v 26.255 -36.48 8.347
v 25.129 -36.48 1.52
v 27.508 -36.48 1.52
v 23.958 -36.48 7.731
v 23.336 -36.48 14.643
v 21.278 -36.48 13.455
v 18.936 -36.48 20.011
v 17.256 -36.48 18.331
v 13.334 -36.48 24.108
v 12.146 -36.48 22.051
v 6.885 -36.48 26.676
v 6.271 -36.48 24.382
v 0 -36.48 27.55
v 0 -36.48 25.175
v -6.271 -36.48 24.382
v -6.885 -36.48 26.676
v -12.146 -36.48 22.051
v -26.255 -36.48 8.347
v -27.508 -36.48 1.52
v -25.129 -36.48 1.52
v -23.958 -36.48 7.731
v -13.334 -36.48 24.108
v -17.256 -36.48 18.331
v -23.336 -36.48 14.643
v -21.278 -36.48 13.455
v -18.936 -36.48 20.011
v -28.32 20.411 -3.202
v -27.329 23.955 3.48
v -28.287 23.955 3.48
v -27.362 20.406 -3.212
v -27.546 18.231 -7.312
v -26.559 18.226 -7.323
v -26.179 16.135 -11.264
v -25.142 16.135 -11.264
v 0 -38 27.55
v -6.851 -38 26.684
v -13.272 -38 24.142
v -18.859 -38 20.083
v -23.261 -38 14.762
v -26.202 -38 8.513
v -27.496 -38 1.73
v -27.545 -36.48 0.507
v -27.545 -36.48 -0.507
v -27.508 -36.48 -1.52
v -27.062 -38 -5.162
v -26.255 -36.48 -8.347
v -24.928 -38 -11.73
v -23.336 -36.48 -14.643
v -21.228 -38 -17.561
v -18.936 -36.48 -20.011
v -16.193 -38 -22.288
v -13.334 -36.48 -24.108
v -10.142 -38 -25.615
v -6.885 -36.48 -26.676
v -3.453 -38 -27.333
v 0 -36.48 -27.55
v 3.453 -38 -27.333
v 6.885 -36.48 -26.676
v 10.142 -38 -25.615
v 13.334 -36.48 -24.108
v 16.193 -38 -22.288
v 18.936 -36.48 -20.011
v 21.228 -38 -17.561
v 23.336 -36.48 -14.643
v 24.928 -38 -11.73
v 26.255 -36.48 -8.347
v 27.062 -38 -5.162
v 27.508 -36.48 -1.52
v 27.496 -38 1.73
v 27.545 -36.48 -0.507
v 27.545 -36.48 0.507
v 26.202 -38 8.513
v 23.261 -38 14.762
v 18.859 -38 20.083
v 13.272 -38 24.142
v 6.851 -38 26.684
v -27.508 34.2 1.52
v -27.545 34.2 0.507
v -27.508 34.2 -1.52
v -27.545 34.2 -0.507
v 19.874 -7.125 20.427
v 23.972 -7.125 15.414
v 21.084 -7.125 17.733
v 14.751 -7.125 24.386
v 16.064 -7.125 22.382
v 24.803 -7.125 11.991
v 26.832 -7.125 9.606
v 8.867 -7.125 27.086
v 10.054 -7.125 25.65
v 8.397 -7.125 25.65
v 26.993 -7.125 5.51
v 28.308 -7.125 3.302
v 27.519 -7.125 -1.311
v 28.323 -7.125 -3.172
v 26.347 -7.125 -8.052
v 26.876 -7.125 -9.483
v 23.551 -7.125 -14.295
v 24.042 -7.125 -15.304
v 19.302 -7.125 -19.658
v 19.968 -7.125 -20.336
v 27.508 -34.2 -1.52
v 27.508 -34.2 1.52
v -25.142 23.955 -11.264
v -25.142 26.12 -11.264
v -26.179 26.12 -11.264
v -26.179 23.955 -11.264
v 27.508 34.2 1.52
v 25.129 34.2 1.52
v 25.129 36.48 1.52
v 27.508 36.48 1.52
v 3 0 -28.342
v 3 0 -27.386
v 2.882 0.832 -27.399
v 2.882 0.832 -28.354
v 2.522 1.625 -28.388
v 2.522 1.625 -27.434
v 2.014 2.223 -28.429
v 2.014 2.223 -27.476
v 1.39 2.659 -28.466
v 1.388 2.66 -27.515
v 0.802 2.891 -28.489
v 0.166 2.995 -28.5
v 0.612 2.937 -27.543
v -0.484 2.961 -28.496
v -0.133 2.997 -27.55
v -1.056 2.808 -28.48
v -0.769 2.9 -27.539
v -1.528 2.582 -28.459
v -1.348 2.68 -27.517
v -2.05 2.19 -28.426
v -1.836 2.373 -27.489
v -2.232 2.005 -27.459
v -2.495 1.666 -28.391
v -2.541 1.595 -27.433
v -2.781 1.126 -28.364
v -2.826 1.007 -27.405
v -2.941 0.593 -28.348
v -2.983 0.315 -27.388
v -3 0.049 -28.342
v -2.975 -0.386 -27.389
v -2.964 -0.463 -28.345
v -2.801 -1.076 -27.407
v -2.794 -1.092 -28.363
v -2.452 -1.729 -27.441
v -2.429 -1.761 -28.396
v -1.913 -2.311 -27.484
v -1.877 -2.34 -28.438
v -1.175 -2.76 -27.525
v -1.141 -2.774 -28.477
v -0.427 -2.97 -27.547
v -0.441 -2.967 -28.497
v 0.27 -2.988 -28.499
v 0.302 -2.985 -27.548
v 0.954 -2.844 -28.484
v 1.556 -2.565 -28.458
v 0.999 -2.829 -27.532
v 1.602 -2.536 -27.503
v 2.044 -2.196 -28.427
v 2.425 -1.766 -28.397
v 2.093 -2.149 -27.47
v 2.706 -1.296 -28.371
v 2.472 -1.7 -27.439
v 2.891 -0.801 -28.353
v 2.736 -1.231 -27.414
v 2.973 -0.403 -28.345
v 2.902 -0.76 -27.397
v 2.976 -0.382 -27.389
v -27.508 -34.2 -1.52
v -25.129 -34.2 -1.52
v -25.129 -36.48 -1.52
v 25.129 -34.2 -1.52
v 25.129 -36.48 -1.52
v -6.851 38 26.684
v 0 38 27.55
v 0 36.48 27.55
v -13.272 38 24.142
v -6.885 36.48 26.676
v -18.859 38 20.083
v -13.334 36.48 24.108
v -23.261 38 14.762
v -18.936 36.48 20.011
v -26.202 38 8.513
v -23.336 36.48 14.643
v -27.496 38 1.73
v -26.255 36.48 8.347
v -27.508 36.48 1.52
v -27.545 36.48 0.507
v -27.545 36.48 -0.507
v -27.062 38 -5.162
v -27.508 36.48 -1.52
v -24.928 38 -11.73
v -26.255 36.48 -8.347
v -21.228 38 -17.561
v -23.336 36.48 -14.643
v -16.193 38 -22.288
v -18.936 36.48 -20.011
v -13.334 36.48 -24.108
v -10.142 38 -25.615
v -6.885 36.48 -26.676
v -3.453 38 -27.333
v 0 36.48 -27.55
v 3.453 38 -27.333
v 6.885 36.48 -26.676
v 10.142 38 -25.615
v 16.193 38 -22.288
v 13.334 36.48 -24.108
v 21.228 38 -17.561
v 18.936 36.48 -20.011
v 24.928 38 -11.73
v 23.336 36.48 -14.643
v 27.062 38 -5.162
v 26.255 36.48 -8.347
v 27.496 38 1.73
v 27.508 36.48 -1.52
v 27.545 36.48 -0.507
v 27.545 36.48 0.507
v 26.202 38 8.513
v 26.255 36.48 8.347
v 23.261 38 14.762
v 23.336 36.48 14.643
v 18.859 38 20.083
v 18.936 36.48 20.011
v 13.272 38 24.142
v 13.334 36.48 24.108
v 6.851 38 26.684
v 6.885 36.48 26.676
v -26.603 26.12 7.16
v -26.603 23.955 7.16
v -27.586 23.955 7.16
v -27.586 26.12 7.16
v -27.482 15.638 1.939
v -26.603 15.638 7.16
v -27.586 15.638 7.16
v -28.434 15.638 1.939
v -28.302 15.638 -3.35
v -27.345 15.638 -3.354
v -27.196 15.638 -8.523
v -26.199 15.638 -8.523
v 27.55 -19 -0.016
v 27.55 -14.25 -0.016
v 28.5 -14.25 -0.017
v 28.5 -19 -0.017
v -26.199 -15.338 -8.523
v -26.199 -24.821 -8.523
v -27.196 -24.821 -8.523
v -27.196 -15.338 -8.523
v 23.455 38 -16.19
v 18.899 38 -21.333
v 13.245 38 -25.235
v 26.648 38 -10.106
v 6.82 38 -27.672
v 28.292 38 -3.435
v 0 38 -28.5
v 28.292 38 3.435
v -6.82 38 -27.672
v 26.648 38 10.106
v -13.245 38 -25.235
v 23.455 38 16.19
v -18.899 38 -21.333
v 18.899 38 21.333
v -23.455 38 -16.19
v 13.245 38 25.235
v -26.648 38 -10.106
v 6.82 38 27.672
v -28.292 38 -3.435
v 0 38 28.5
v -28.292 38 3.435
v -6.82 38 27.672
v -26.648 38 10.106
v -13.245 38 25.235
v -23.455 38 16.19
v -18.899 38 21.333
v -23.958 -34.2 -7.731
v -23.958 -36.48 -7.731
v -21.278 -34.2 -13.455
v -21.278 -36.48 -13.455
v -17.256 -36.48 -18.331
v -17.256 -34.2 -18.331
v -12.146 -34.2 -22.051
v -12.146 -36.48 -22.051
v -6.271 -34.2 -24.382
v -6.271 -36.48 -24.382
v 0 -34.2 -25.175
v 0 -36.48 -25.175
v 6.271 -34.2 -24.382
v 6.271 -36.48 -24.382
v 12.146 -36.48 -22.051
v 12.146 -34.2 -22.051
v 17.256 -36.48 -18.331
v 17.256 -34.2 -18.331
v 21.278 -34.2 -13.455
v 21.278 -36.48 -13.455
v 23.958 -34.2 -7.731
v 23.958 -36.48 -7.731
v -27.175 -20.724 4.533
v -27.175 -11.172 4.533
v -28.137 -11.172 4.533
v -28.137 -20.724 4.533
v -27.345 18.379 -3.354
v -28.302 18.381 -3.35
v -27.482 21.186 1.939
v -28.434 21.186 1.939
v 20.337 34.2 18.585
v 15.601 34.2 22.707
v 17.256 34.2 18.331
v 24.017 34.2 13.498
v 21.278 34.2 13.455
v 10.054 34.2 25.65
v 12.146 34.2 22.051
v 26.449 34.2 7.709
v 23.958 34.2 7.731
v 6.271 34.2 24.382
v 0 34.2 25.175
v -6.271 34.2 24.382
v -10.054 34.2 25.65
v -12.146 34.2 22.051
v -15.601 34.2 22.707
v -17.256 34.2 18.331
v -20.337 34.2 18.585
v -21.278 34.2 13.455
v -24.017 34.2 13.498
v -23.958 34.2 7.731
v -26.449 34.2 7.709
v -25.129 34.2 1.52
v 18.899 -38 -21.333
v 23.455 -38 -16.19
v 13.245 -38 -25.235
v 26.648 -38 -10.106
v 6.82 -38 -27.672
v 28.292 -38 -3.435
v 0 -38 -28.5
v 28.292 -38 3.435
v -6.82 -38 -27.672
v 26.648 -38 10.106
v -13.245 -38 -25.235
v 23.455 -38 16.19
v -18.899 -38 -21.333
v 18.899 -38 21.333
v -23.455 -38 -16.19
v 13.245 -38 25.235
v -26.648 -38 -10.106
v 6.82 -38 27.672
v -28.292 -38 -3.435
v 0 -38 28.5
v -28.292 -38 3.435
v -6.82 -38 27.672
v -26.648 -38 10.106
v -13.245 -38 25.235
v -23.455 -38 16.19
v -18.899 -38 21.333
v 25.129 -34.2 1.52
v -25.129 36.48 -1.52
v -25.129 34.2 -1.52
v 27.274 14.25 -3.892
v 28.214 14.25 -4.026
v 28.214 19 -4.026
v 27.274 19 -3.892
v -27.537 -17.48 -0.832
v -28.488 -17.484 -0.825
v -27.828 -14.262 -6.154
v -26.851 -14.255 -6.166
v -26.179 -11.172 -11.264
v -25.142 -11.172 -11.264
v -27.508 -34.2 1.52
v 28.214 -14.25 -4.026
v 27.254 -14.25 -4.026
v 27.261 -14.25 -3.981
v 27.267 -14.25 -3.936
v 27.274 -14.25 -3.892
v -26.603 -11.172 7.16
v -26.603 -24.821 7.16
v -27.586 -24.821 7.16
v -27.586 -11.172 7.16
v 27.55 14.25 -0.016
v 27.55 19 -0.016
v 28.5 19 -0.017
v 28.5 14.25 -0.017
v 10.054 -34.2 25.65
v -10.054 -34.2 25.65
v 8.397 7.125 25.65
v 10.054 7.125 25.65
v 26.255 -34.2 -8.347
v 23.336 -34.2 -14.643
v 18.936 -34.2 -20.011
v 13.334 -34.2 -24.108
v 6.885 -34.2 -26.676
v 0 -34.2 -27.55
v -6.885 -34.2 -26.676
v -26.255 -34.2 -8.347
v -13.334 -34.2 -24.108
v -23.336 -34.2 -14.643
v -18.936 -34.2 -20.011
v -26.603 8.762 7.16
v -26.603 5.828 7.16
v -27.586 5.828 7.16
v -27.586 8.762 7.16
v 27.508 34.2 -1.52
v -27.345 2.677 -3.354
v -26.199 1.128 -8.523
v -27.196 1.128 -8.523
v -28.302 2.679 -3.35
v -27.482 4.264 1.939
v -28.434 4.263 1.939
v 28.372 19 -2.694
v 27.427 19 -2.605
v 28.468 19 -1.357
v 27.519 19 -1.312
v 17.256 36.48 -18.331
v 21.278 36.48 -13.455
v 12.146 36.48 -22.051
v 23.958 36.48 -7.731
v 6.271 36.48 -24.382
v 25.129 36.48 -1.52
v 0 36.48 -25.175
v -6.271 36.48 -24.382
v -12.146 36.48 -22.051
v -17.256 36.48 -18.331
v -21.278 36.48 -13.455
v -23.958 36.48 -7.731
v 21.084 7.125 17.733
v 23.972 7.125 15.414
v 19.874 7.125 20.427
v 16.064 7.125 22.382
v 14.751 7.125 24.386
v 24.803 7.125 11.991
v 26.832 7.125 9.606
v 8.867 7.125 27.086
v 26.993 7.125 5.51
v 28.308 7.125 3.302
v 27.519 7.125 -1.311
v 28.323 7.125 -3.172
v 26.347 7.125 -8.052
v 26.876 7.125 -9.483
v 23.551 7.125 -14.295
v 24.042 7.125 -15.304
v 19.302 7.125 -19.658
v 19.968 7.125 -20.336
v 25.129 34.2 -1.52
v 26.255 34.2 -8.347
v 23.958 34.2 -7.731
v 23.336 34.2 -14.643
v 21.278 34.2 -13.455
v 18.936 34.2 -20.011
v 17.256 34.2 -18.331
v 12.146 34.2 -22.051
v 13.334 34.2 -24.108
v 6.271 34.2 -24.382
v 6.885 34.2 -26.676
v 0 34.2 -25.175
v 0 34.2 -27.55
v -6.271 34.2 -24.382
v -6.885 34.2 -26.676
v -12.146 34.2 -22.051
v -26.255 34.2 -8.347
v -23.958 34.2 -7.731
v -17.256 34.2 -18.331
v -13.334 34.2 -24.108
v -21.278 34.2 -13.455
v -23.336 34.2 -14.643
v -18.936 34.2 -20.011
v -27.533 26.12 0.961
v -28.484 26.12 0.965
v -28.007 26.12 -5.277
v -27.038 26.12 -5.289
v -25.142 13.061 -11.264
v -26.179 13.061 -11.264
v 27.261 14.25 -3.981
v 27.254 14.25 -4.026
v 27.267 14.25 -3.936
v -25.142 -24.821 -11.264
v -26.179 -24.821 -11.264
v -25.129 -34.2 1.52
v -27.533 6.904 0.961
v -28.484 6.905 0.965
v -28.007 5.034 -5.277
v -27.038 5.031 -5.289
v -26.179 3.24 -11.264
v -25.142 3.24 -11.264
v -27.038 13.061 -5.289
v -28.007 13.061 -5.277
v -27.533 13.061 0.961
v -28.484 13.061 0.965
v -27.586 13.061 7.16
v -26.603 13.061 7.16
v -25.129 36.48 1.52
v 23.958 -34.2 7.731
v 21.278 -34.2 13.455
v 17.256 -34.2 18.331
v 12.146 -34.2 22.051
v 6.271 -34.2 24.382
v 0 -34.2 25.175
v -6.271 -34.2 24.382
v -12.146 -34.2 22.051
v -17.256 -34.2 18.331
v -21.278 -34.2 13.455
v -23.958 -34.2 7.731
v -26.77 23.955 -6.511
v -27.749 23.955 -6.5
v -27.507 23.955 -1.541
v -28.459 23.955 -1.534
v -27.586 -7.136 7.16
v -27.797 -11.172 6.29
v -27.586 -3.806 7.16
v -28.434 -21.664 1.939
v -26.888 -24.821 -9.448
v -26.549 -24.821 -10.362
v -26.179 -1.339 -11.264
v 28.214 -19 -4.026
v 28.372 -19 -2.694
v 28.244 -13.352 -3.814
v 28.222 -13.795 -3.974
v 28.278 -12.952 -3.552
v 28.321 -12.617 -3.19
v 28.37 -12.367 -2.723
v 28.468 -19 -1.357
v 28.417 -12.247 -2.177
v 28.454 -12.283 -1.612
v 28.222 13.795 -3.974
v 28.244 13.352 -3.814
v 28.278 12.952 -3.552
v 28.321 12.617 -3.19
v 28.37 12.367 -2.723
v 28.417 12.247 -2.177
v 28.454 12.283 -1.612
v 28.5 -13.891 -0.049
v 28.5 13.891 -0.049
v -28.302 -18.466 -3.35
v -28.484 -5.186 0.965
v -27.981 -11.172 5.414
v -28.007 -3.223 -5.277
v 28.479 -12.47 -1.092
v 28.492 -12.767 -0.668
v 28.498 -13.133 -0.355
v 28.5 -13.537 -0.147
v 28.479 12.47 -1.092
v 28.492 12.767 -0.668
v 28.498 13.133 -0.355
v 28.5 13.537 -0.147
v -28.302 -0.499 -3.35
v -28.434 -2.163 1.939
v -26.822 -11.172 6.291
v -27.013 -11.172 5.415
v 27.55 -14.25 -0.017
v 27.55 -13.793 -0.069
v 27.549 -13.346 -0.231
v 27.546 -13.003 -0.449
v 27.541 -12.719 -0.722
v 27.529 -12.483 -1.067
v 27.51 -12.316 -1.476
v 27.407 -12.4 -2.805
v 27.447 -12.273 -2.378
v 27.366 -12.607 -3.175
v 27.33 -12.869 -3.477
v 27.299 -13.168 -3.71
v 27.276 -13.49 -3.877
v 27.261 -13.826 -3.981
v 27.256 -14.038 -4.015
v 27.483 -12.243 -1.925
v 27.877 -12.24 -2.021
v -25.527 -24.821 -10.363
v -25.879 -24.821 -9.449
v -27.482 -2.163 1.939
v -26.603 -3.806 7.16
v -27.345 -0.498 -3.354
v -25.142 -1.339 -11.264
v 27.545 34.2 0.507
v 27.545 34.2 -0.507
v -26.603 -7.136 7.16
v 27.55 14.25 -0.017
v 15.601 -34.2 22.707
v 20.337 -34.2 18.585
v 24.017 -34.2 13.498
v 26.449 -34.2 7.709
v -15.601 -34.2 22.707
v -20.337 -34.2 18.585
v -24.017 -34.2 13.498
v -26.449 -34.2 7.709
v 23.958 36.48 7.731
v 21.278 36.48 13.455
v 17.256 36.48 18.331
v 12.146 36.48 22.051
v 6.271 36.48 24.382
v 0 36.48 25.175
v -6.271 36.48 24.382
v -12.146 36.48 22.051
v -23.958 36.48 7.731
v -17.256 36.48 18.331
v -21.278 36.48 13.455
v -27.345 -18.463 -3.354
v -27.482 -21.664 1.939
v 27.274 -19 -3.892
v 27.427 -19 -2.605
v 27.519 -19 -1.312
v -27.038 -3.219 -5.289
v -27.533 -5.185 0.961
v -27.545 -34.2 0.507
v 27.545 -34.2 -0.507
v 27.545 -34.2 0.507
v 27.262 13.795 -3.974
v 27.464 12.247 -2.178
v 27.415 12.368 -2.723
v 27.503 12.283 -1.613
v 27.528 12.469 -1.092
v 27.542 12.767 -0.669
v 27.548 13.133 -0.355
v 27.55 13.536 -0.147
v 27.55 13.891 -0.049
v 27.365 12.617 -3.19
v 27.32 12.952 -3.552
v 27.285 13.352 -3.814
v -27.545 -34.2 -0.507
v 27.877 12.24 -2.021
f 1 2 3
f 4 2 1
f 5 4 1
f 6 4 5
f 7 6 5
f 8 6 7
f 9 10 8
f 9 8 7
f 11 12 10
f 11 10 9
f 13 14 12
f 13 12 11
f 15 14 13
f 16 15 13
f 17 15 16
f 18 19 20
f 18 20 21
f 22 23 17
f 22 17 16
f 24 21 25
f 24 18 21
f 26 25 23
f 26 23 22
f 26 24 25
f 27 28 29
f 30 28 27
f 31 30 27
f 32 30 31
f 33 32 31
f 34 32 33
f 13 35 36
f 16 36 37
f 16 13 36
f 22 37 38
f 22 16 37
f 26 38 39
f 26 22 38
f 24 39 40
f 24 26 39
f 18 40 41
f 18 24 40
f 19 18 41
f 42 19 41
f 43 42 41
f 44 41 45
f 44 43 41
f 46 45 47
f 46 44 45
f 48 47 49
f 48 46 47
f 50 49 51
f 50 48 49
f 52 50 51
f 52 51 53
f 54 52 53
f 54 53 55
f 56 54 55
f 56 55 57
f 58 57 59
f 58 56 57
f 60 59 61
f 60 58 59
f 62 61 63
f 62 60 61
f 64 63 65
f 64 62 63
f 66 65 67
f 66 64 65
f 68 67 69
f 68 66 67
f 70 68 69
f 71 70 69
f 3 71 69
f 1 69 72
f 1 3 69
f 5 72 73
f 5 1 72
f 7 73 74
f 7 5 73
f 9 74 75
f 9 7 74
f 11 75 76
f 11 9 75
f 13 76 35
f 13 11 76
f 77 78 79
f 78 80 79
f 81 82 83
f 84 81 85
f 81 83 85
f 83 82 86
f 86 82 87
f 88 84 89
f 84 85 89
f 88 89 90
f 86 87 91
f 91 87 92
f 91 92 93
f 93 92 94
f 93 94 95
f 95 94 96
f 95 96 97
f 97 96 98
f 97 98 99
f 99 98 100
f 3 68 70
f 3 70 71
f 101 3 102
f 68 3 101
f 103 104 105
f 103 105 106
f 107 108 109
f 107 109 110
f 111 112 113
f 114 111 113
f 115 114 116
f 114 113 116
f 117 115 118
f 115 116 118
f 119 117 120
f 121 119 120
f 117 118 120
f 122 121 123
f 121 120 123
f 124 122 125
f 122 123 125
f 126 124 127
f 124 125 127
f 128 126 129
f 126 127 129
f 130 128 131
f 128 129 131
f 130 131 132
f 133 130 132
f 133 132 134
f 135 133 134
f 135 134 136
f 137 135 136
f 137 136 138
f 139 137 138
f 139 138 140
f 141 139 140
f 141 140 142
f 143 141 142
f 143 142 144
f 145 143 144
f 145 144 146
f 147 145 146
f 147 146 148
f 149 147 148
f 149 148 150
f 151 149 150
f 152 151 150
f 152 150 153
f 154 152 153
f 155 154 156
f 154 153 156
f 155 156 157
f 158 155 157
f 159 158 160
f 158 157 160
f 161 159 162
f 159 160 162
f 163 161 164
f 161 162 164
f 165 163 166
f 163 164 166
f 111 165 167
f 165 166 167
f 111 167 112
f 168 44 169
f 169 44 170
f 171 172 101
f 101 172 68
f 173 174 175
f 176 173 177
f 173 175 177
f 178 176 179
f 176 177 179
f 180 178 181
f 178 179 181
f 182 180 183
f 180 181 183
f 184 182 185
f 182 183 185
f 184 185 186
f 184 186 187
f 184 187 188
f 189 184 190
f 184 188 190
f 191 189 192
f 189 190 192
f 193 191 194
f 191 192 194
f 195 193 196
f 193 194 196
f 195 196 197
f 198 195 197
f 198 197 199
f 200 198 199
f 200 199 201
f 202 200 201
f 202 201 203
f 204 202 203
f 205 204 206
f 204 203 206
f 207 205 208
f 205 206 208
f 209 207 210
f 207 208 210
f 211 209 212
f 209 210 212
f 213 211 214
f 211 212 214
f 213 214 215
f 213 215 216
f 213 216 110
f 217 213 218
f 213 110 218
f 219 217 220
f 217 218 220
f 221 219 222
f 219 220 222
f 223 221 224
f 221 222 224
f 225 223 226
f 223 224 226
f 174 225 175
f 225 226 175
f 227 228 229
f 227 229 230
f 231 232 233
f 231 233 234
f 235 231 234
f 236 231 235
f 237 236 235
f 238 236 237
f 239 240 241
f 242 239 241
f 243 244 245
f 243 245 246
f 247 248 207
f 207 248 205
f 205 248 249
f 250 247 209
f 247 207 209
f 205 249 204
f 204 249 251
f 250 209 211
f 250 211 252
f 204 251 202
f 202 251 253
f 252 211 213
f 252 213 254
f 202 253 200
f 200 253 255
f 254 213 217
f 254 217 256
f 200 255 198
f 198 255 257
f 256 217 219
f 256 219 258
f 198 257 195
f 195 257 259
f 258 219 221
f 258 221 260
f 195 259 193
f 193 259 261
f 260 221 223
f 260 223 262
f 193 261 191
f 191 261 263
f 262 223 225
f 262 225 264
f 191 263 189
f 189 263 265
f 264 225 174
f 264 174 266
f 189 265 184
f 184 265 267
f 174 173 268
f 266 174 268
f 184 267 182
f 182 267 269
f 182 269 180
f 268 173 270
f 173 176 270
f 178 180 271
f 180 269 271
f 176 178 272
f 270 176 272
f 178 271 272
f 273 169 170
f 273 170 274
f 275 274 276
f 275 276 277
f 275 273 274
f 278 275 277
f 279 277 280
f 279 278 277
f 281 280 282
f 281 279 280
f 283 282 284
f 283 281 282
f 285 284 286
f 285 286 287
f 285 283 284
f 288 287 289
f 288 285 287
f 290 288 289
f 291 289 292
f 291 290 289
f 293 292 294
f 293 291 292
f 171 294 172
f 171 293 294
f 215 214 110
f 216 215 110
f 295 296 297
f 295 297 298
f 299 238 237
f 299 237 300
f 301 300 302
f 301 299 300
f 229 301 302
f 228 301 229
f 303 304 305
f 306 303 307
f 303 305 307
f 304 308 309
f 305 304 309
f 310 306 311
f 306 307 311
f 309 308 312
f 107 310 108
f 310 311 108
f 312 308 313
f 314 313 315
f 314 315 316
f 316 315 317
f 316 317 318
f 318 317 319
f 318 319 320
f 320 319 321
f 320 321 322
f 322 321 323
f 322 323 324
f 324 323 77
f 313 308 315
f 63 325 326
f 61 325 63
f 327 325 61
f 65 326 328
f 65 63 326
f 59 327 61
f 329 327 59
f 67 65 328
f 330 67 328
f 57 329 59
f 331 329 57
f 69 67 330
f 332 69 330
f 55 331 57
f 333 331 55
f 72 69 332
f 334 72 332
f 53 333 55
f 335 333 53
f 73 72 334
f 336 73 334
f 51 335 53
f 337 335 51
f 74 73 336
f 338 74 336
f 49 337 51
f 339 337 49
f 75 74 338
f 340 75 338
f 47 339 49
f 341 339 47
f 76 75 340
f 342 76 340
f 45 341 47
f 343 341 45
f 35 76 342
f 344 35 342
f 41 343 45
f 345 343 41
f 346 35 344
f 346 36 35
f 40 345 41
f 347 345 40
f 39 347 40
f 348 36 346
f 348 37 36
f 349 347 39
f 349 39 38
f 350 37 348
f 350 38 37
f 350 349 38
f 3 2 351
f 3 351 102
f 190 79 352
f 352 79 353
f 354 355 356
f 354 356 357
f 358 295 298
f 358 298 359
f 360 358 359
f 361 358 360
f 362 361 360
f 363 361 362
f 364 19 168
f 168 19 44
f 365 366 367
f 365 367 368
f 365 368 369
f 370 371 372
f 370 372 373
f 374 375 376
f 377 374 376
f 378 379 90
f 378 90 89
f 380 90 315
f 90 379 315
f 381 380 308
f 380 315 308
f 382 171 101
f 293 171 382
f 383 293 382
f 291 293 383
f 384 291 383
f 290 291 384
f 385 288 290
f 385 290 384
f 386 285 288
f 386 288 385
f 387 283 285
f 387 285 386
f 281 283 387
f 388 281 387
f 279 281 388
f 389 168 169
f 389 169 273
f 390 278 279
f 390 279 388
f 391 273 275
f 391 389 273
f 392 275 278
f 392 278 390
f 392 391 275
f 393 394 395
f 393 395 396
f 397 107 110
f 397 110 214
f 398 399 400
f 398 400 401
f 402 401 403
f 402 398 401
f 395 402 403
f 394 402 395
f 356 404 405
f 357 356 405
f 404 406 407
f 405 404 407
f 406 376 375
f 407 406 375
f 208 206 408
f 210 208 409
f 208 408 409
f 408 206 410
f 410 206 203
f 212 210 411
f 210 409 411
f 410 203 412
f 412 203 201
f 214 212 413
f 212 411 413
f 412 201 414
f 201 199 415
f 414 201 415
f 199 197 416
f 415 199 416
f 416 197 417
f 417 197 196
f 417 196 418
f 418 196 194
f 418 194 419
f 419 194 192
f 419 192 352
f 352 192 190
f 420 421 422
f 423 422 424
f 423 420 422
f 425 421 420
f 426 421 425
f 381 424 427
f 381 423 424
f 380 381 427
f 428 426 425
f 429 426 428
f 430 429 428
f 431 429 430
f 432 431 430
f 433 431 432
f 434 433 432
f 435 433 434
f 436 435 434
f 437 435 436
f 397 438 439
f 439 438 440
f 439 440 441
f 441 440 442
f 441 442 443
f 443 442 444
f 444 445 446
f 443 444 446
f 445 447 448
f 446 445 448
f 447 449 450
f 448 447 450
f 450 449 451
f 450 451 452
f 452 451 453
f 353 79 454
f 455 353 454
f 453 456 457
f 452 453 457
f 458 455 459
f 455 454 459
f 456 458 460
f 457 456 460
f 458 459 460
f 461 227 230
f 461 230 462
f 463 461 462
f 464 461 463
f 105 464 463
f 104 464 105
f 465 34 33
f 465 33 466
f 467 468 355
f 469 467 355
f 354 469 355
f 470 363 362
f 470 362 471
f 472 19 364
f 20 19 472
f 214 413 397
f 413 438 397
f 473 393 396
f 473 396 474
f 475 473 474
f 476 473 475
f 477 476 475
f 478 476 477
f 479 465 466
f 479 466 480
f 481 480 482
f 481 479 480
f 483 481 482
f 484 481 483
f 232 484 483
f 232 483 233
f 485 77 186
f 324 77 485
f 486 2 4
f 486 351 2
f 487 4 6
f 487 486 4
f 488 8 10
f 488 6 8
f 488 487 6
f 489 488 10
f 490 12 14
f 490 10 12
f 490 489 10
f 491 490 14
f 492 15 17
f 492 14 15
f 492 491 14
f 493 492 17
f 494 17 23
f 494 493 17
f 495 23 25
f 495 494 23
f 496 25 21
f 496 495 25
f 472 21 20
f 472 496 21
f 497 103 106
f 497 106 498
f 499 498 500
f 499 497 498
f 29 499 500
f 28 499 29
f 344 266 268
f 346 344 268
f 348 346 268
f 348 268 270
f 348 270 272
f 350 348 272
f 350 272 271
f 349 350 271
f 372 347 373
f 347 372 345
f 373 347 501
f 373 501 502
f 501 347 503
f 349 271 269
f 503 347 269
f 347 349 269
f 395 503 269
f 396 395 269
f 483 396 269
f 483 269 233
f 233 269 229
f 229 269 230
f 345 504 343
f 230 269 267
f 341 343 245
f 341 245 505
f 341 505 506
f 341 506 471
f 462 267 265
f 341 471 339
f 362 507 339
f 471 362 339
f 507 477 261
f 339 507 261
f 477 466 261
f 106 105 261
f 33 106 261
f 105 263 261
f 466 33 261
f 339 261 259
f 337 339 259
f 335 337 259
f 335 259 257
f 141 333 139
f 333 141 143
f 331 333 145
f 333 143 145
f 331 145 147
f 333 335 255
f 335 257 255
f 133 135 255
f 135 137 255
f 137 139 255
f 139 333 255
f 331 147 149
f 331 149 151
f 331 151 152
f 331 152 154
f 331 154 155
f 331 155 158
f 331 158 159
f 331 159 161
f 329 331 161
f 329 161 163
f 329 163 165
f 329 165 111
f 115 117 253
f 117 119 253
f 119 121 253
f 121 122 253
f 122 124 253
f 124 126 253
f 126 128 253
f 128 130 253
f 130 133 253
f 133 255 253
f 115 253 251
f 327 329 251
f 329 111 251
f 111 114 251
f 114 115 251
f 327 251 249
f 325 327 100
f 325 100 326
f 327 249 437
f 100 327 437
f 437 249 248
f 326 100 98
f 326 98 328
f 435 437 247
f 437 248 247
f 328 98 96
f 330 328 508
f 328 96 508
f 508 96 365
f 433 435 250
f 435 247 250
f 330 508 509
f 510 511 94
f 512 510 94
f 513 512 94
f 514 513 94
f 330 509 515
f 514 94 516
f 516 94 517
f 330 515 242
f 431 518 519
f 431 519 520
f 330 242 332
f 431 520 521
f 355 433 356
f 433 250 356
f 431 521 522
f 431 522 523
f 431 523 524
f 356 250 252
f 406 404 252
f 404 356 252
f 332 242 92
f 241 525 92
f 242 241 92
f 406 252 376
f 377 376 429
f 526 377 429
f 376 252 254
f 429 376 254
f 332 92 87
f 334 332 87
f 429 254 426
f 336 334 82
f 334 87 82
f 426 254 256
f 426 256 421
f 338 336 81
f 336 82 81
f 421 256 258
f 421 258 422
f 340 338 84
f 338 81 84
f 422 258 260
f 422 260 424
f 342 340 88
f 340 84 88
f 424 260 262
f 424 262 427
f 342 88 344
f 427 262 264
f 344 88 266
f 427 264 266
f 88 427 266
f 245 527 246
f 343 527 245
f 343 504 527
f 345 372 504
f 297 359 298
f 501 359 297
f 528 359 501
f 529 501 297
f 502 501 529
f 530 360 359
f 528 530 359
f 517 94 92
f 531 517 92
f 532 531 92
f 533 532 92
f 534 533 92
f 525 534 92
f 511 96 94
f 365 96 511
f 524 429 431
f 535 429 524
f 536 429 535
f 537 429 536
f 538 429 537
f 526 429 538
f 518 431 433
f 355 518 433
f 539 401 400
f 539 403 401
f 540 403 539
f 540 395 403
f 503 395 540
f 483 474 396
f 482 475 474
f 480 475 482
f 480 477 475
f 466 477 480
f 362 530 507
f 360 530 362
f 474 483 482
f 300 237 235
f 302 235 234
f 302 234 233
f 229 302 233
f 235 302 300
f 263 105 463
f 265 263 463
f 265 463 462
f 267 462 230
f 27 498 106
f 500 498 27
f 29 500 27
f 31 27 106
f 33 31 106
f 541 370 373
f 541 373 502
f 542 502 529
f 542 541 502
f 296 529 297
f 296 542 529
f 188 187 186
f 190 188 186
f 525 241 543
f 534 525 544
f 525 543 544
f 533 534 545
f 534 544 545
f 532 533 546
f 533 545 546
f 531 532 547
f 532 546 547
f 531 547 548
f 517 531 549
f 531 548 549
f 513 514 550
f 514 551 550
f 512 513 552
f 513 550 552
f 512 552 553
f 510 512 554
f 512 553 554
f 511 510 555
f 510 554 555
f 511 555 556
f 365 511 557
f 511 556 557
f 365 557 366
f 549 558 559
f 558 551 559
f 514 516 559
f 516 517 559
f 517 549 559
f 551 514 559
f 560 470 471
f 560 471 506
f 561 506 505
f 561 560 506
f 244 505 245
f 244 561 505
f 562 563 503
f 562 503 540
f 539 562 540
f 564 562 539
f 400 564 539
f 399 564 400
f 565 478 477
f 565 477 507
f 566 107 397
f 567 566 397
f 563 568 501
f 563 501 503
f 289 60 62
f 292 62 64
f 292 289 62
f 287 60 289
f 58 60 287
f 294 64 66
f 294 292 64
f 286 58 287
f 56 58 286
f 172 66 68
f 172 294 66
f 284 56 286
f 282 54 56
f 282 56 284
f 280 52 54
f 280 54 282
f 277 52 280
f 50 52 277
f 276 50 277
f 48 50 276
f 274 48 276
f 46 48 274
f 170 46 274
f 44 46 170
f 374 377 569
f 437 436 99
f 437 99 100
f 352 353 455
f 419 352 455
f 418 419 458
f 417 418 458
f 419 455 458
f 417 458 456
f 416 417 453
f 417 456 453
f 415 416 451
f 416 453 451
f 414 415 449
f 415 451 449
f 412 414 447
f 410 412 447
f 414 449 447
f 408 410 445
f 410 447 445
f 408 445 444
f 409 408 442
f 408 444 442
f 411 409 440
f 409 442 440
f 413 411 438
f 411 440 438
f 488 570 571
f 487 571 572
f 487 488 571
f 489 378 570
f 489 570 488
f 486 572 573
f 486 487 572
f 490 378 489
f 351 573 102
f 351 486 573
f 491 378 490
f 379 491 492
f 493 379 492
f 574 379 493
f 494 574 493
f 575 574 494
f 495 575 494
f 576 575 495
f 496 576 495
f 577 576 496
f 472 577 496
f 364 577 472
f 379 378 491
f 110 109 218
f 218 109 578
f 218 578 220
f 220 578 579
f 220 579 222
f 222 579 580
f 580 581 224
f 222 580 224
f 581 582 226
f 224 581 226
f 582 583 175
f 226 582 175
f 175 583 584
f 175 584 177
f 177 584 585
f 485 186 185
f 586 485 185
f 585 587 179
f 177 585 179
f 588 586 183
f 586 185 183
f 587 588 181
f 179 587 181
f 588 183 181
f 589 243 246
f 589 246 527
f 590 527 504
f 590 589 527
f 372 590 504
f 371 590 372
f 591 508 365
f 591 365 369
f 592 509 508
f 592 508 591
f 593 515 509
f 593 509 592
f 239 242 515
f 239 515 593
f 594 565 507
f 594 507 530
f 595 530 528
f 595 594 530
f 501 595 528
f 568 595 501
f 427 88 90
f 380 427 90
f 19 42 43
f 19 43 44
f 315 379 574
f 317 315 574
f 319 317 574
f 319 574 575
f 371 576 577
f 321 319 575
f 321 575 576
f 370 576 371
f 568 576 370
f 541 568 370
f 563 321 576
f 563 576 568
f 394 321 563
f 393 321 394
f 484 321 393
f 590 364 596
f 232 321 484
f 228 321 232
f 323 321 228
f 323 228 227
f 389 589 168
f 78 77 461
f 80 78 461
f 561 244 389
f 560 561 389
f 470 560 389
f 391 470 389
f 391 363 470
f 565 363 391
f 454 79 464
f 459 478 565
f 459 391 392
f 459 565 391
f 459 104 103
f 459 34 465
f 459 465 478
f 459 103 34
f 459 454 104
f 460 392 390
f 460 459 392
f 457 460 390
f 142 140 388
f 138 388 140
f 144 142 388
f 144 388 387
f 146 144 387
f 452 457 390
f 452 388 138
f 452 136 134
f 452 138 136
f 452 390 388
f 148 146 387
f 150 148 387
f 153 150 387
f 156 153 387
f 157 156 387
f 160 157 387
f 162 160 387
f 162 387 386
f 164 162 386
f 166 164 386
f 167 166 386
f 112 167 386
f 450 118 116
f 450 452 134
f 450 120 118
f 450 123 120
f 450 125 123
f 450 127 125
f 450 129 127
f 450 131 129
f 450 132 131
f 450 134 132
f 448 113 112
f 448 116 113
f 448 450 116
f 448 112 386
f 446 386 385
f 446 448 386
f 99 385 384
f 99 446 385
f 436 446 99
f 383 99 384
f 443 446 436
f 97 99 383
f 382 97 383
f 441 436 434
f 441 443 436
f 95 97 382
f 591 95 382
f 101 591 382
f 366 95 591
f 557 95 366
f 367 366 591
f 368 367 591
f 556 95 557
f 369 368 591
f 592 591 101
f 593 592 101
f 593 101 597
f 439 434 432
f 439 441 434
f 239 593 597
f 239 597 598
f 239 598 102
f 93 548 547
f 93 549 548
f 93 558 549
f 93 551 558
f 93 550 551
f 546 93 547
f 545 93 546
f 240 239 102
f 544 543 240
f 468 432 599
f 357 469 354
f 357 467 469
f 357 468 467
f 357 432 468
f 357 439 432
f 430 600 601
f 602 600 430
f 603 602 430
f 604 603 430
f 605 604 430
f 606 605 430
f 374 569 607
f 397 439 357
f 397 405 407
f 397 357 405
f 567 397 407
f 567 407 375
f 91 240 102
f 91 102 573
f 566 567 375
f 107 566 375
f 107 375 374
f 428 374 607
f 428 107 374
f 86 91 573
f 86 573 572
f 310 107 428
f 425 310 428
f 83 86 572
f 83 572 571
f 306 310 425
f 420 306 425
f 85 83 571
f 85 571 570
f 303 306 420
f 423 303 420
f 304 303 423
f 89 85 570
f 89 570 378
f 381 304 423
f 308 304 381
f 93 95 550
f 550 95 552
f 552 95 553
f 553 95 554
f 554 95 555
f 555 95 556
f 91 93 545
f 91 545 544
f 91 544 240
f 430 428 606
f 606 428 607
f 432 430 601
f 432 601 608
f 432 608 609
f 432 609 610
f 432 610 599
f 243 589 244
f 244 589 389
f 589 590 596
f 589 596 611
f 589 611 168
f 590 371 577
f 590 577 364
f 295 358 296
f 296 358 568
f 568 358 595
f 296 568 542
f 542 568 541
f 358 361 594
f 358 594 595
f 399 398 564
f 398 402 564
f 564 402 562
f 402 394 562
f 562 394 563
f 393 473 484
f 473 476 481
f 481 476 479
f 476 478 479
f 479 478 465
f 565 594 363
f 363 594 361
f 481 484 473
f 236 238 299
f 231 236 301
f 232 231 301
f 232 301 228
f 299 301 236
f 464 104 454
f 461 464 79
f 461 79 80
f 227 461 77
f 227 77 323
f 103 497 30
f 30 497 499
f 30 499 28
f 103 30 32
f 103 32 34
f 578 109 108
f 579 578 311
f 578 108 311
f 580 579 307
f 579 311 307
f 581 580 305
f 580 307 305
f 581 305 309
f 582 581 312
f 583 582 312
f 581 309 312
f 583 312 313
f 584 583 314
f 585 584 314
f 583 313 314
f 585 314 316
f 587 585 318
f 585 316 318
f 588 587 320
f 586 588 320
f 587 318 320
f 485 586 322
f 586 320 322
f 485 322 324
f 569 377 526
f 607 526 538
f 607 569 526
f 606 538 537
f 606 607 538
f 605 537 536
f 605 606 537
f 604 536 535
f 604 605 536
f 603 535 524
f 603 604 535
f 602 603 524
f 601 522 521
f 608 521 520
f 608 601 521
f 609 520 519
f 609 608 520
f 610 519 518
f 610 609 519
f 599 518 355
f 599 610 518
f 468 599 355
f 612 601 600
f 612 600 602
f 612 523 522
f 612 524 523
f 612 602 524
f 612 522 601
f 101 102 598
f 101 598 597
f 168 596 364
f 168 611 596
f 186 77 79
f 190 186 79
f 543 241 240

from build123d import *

# Parameters (mm, degrees)
EXTRUDE_11_REACH             = 60.31
EXTRUDE_11_DIRECTION_2_REACH = 60.31
CUT_EXTRUDE_1_DEPTH          = 7.5
CUT_EXTRUDE_1_DEPTH_BACK     = 7.5
CUT_EXTRUDE_2_DEPTH          = 5
CUT_EXTRUDE_START            = 28.688718626
CUT_EXTRUDE_3_DEPTH          = 1.311276176
CUT_EXTRUDE_4_DEPTH          = 50
CUT_EXTRUDE_4_DEPTH_BACK     = 50
SKETCH_14_W                  = 57.911656858
SKETCH_14_H                  = 3.2
SCALE_1_SCALE                = 0.95
SKETCH_15_R                  = 3
CUT_EXTRUDE_5_DEPTH          = 56.394043173
CUT_EXTRUDE_8_DEPTH          = 56.394043173


# Read off the part's stored shape, not the designer's step: 切除-拉伸3
with BuildPart() as part:
    # 草图1 → 旋转1 (revolve)
    with BuildSketch(Plane.XY, mode=Mode.PRIVATE) as revolve_1_sk:
        Polygon((26.5, 38.4), (26.5, 36), (29, 36), (29, 0), (30, 0), (30, 40), (29, 40), (29, 38.4), align=None)
    revolve_1 = revolve(revolve_1_sk.sketch.rotate(Axis((0, 66, 0), (0, -1, 0)), 90), axis=Axis((0, 66, 0), (0, -1, 0)))

    # 镜向1: 旋转1 across plane
    add(revolve_1.mirror(Plane.ZX))

    # 凸台-拉伸11: up to this face of the body (flat: up to its plane)
    extrude_11_end = Plane(part.part.faces().sort_by_distance((0, 36, -27.320243866))[0])
    # 草图11 → 凸台-拉伸11 (add, up to the picked face)
    with BuildSketch(Plane(origin=(0, 0, 0), x_dir=(1, 0, 0), z_dir=(0, 1, 0)), mode=Mode.PRIVATE) as extrude_11_sk1:
        with BuildLine():
            Line((-13.076696831, -27), (13.076696831, -27))
            ThreePointArc((13.076696831, -27), (0, -30), (-13.076696831, -27))
        make_face()
    extrude_11_tool1 = split(extrude(extrude_11_sk1.sketch, amount=EXTRUDE_11_REACH, mode=Mode.PRIVATE), bisect_by=extrude_11_end, keep=Keep.BOTH, mode=Mode.PRIVATE)
    add(extrude_11_tool1.solids().sort_by(Axis((0, 0, 28.205296), (0, 1, 0)))[0])

    # 凸台-拉伸11 direction 2: up to this face of the body (flat: up to its plane)
    extrude_11_direction_2_end = Plane(part.part.faces().sort_by_distance((0, -36, -27.320243866))[0])
    # 草图11 → 凸台-拉伸11 direction 2 (add, up to the picked face)
    with BuildSketch(Plane(origin=(0, 0, 0), x_dir=(1, 0, 0), z_dir=(0, 1, 0)), mode=Mode.PRIVATE) as extrude_11_direction_2_sk1:
        with BuildLine():
            Line((-13.076696831, -27), (13.076696831, -27))
            ThreePointArc((13.076696831, -27), (0, -30), (-13.076696831, -27))
        make_face()
    extrude_11_direction_2_tool1 = split(extrude(extrude_11_direction_2_sk1.sketch, amount=-EXTRUDE_11_DIRECTION_2_REACH, mode=Mode.PRIVATE), bisect_by=extrude_11_direction_2_end, keep=Keep.BOTH, mode=Mode.PRIVATE)
    add(extrude_11_direction_2_tool1.solids().sort_by(Axis((0, 0, 28.205296), (0, -1, 0)))[0])

    # 草图12 → 切除-拉伸1 (cut, two sides: drawn at the far end of the back side and taken through both)
    with BuildSketch(Plane(origin=(0, 0, 0), x_dir=(1, 0, 0), z_dir=(0, 1, 0)).offset(-CUT_EXTRUDE_1_DEPTH_BACK)):
        with BuildLine():
            Line((0, 0), (22.520337054, 22.934948885))
            ThreePointArc((22.520337054, 22.934948885), (31.296937417, -7.32660697), (10, -30.547953473))
            Line((10, -30.547953473), (0, 0))
        make_face()
    extrude(amount=CUT_EXTRUDE_1_DEPTH + CUT_EXTRUDE_1_DEPTH_BACK, mode=Mode.SUBTRACT)

    # Sketch 3D_2 → 切除-拉伸2 (cut)
    with BuildSketch(Plane(origin=(35, 15, -4.993961669), x_dir=(-0.989973390659655, 0, 0.1412539761770484), z_dir=(0, 1, 0))):
        with BuildLine():
            Line((0, 0), (35.354485616, 0))
            Line((35.354485616, 0), (0.330334968, 4.976372773))
            ThreePointArc((0.330334968, 4.976372773), (0.075684949, 2.494126297), (0, 0))
        make_face()
    cut_extrude_2 = extrude(amount=CUT_EXTRUDE_2_DEPTH, mode=Mode.SUBTRACT)

    # 镜向2: 切除-拉伸2 across plane
    add(cut_extrude_2.mirror(Plane.ZX), mode=Mode.SUBTRACT)

    # 切除-拉伸3 outline → 切除-拉伸3 (cut)
    with BuildSketch(Plane.YZ.offset(CUT_EXTRUDE_START)):
        with BuildLine():
            Line((15, -4.237619285), (15, -0.017659399))
            add(Edge.make_bspline(
                [(15, -0.017659399), (12.884666816, -0.017659399), (12.884666816, -2.127639342), (12.884666816, -4.237619285), (15, -4.237619285)],
                knots=[3.141592654, 3.141592654, 3.141592654, 4.71238898, 4.71238898, 6.283185307, 6.283185307, 6.283185307], degree=2, weights=[1, 0.707106781, 1, 0.707106781, 1]))
        make_face()
    cut_extrude_3 = extrude(amount=CUT_EXTRUDE_3_DEPTH, mode=Mode.SUBTRACT)

    # 镜向3: 切除-拉伸3 across plane
    add(cut_extrude_3.mirror(Plane.ZX), mode=Mode.SUBTRACT)

    # 草图14 → 切除-拉伸4 (cut, two sides: drawn at the far end of the back side and taken through both)
    with BuildSketch(Plane(origin=(0, 0, 0), x_dir=(1, 0, 0), z_dir=(0, 1, 0)).offset(-CUT_EXTRUDE_4_DEPTH_BACK)):
        Rectangle(SKETCH_14_W, SKETCH_14_H)
    extrude(amount=CUT_EXTRUDE_4_DEPTH + CUT_EXTRUDE_4_DEPTH_BACK, mode=Mode.SUBTRACT)


with BuildPart() as part_1:
    # 缩放比例1: scaled about (0, 0, 0)
    add(part.part.scale(SCALE_1_SCALE))

    # 草图15 → 切除-拉伸5 (cut, through all)
    with BuildSketch(Plane.XY):
        Circle(SKETCH_15_R)
    extrude(amount=-CUT_EXTRUDE_5_DEPTH, mode=Mode.SUBTRACT)

    # 草图17 → 切除-拉伸8 (cut, through all)
    with BuildSketch(Plane(origin=(0, 0, 0), x_dir=(0, 0, -1), z_dir=(1, 0, 0))):
        Polygon((-7.160216771, -7.13563981), (-7.160216771, -3.80592806), (8.522673115, 1.128292258), (-7.160216771, 5.828299564), (-7.160216771, 8.761718002), (11.264359726, 3.240054279), (11.264359726, -1.338817901), align=None)
        Polygon((-7.160216771, 13.060987956), (-7.160216771, 15.637647282), (8.522673115, 15.637647282), (-7.160216771, 23.954695298), (-7.160216771, 26.120129901), (11.264359726, 26.120129901), (11.264359726, 23.954695298), (-3.480090007, 23.954695298), (11.264359726, 16.13532672), (11.264359726, 13.060987956), align=None)
        Polygon((11.264359726, -11.172137384), (11.264359726, -24.820978501), (8.522673115, -24.820978501), (8.522673115, -15.337987323), (-7.160216771, -24.820978501), (-7.160216771, -11.172137384), (-4.532843234, -11.172137384), (-4.532843234, -20.724250381), align=None)
    extrude(amount=-CUT_EXTRUDE_8_DEPTH, mode=Mode.SUBTRACT)


solid = part_1.part
